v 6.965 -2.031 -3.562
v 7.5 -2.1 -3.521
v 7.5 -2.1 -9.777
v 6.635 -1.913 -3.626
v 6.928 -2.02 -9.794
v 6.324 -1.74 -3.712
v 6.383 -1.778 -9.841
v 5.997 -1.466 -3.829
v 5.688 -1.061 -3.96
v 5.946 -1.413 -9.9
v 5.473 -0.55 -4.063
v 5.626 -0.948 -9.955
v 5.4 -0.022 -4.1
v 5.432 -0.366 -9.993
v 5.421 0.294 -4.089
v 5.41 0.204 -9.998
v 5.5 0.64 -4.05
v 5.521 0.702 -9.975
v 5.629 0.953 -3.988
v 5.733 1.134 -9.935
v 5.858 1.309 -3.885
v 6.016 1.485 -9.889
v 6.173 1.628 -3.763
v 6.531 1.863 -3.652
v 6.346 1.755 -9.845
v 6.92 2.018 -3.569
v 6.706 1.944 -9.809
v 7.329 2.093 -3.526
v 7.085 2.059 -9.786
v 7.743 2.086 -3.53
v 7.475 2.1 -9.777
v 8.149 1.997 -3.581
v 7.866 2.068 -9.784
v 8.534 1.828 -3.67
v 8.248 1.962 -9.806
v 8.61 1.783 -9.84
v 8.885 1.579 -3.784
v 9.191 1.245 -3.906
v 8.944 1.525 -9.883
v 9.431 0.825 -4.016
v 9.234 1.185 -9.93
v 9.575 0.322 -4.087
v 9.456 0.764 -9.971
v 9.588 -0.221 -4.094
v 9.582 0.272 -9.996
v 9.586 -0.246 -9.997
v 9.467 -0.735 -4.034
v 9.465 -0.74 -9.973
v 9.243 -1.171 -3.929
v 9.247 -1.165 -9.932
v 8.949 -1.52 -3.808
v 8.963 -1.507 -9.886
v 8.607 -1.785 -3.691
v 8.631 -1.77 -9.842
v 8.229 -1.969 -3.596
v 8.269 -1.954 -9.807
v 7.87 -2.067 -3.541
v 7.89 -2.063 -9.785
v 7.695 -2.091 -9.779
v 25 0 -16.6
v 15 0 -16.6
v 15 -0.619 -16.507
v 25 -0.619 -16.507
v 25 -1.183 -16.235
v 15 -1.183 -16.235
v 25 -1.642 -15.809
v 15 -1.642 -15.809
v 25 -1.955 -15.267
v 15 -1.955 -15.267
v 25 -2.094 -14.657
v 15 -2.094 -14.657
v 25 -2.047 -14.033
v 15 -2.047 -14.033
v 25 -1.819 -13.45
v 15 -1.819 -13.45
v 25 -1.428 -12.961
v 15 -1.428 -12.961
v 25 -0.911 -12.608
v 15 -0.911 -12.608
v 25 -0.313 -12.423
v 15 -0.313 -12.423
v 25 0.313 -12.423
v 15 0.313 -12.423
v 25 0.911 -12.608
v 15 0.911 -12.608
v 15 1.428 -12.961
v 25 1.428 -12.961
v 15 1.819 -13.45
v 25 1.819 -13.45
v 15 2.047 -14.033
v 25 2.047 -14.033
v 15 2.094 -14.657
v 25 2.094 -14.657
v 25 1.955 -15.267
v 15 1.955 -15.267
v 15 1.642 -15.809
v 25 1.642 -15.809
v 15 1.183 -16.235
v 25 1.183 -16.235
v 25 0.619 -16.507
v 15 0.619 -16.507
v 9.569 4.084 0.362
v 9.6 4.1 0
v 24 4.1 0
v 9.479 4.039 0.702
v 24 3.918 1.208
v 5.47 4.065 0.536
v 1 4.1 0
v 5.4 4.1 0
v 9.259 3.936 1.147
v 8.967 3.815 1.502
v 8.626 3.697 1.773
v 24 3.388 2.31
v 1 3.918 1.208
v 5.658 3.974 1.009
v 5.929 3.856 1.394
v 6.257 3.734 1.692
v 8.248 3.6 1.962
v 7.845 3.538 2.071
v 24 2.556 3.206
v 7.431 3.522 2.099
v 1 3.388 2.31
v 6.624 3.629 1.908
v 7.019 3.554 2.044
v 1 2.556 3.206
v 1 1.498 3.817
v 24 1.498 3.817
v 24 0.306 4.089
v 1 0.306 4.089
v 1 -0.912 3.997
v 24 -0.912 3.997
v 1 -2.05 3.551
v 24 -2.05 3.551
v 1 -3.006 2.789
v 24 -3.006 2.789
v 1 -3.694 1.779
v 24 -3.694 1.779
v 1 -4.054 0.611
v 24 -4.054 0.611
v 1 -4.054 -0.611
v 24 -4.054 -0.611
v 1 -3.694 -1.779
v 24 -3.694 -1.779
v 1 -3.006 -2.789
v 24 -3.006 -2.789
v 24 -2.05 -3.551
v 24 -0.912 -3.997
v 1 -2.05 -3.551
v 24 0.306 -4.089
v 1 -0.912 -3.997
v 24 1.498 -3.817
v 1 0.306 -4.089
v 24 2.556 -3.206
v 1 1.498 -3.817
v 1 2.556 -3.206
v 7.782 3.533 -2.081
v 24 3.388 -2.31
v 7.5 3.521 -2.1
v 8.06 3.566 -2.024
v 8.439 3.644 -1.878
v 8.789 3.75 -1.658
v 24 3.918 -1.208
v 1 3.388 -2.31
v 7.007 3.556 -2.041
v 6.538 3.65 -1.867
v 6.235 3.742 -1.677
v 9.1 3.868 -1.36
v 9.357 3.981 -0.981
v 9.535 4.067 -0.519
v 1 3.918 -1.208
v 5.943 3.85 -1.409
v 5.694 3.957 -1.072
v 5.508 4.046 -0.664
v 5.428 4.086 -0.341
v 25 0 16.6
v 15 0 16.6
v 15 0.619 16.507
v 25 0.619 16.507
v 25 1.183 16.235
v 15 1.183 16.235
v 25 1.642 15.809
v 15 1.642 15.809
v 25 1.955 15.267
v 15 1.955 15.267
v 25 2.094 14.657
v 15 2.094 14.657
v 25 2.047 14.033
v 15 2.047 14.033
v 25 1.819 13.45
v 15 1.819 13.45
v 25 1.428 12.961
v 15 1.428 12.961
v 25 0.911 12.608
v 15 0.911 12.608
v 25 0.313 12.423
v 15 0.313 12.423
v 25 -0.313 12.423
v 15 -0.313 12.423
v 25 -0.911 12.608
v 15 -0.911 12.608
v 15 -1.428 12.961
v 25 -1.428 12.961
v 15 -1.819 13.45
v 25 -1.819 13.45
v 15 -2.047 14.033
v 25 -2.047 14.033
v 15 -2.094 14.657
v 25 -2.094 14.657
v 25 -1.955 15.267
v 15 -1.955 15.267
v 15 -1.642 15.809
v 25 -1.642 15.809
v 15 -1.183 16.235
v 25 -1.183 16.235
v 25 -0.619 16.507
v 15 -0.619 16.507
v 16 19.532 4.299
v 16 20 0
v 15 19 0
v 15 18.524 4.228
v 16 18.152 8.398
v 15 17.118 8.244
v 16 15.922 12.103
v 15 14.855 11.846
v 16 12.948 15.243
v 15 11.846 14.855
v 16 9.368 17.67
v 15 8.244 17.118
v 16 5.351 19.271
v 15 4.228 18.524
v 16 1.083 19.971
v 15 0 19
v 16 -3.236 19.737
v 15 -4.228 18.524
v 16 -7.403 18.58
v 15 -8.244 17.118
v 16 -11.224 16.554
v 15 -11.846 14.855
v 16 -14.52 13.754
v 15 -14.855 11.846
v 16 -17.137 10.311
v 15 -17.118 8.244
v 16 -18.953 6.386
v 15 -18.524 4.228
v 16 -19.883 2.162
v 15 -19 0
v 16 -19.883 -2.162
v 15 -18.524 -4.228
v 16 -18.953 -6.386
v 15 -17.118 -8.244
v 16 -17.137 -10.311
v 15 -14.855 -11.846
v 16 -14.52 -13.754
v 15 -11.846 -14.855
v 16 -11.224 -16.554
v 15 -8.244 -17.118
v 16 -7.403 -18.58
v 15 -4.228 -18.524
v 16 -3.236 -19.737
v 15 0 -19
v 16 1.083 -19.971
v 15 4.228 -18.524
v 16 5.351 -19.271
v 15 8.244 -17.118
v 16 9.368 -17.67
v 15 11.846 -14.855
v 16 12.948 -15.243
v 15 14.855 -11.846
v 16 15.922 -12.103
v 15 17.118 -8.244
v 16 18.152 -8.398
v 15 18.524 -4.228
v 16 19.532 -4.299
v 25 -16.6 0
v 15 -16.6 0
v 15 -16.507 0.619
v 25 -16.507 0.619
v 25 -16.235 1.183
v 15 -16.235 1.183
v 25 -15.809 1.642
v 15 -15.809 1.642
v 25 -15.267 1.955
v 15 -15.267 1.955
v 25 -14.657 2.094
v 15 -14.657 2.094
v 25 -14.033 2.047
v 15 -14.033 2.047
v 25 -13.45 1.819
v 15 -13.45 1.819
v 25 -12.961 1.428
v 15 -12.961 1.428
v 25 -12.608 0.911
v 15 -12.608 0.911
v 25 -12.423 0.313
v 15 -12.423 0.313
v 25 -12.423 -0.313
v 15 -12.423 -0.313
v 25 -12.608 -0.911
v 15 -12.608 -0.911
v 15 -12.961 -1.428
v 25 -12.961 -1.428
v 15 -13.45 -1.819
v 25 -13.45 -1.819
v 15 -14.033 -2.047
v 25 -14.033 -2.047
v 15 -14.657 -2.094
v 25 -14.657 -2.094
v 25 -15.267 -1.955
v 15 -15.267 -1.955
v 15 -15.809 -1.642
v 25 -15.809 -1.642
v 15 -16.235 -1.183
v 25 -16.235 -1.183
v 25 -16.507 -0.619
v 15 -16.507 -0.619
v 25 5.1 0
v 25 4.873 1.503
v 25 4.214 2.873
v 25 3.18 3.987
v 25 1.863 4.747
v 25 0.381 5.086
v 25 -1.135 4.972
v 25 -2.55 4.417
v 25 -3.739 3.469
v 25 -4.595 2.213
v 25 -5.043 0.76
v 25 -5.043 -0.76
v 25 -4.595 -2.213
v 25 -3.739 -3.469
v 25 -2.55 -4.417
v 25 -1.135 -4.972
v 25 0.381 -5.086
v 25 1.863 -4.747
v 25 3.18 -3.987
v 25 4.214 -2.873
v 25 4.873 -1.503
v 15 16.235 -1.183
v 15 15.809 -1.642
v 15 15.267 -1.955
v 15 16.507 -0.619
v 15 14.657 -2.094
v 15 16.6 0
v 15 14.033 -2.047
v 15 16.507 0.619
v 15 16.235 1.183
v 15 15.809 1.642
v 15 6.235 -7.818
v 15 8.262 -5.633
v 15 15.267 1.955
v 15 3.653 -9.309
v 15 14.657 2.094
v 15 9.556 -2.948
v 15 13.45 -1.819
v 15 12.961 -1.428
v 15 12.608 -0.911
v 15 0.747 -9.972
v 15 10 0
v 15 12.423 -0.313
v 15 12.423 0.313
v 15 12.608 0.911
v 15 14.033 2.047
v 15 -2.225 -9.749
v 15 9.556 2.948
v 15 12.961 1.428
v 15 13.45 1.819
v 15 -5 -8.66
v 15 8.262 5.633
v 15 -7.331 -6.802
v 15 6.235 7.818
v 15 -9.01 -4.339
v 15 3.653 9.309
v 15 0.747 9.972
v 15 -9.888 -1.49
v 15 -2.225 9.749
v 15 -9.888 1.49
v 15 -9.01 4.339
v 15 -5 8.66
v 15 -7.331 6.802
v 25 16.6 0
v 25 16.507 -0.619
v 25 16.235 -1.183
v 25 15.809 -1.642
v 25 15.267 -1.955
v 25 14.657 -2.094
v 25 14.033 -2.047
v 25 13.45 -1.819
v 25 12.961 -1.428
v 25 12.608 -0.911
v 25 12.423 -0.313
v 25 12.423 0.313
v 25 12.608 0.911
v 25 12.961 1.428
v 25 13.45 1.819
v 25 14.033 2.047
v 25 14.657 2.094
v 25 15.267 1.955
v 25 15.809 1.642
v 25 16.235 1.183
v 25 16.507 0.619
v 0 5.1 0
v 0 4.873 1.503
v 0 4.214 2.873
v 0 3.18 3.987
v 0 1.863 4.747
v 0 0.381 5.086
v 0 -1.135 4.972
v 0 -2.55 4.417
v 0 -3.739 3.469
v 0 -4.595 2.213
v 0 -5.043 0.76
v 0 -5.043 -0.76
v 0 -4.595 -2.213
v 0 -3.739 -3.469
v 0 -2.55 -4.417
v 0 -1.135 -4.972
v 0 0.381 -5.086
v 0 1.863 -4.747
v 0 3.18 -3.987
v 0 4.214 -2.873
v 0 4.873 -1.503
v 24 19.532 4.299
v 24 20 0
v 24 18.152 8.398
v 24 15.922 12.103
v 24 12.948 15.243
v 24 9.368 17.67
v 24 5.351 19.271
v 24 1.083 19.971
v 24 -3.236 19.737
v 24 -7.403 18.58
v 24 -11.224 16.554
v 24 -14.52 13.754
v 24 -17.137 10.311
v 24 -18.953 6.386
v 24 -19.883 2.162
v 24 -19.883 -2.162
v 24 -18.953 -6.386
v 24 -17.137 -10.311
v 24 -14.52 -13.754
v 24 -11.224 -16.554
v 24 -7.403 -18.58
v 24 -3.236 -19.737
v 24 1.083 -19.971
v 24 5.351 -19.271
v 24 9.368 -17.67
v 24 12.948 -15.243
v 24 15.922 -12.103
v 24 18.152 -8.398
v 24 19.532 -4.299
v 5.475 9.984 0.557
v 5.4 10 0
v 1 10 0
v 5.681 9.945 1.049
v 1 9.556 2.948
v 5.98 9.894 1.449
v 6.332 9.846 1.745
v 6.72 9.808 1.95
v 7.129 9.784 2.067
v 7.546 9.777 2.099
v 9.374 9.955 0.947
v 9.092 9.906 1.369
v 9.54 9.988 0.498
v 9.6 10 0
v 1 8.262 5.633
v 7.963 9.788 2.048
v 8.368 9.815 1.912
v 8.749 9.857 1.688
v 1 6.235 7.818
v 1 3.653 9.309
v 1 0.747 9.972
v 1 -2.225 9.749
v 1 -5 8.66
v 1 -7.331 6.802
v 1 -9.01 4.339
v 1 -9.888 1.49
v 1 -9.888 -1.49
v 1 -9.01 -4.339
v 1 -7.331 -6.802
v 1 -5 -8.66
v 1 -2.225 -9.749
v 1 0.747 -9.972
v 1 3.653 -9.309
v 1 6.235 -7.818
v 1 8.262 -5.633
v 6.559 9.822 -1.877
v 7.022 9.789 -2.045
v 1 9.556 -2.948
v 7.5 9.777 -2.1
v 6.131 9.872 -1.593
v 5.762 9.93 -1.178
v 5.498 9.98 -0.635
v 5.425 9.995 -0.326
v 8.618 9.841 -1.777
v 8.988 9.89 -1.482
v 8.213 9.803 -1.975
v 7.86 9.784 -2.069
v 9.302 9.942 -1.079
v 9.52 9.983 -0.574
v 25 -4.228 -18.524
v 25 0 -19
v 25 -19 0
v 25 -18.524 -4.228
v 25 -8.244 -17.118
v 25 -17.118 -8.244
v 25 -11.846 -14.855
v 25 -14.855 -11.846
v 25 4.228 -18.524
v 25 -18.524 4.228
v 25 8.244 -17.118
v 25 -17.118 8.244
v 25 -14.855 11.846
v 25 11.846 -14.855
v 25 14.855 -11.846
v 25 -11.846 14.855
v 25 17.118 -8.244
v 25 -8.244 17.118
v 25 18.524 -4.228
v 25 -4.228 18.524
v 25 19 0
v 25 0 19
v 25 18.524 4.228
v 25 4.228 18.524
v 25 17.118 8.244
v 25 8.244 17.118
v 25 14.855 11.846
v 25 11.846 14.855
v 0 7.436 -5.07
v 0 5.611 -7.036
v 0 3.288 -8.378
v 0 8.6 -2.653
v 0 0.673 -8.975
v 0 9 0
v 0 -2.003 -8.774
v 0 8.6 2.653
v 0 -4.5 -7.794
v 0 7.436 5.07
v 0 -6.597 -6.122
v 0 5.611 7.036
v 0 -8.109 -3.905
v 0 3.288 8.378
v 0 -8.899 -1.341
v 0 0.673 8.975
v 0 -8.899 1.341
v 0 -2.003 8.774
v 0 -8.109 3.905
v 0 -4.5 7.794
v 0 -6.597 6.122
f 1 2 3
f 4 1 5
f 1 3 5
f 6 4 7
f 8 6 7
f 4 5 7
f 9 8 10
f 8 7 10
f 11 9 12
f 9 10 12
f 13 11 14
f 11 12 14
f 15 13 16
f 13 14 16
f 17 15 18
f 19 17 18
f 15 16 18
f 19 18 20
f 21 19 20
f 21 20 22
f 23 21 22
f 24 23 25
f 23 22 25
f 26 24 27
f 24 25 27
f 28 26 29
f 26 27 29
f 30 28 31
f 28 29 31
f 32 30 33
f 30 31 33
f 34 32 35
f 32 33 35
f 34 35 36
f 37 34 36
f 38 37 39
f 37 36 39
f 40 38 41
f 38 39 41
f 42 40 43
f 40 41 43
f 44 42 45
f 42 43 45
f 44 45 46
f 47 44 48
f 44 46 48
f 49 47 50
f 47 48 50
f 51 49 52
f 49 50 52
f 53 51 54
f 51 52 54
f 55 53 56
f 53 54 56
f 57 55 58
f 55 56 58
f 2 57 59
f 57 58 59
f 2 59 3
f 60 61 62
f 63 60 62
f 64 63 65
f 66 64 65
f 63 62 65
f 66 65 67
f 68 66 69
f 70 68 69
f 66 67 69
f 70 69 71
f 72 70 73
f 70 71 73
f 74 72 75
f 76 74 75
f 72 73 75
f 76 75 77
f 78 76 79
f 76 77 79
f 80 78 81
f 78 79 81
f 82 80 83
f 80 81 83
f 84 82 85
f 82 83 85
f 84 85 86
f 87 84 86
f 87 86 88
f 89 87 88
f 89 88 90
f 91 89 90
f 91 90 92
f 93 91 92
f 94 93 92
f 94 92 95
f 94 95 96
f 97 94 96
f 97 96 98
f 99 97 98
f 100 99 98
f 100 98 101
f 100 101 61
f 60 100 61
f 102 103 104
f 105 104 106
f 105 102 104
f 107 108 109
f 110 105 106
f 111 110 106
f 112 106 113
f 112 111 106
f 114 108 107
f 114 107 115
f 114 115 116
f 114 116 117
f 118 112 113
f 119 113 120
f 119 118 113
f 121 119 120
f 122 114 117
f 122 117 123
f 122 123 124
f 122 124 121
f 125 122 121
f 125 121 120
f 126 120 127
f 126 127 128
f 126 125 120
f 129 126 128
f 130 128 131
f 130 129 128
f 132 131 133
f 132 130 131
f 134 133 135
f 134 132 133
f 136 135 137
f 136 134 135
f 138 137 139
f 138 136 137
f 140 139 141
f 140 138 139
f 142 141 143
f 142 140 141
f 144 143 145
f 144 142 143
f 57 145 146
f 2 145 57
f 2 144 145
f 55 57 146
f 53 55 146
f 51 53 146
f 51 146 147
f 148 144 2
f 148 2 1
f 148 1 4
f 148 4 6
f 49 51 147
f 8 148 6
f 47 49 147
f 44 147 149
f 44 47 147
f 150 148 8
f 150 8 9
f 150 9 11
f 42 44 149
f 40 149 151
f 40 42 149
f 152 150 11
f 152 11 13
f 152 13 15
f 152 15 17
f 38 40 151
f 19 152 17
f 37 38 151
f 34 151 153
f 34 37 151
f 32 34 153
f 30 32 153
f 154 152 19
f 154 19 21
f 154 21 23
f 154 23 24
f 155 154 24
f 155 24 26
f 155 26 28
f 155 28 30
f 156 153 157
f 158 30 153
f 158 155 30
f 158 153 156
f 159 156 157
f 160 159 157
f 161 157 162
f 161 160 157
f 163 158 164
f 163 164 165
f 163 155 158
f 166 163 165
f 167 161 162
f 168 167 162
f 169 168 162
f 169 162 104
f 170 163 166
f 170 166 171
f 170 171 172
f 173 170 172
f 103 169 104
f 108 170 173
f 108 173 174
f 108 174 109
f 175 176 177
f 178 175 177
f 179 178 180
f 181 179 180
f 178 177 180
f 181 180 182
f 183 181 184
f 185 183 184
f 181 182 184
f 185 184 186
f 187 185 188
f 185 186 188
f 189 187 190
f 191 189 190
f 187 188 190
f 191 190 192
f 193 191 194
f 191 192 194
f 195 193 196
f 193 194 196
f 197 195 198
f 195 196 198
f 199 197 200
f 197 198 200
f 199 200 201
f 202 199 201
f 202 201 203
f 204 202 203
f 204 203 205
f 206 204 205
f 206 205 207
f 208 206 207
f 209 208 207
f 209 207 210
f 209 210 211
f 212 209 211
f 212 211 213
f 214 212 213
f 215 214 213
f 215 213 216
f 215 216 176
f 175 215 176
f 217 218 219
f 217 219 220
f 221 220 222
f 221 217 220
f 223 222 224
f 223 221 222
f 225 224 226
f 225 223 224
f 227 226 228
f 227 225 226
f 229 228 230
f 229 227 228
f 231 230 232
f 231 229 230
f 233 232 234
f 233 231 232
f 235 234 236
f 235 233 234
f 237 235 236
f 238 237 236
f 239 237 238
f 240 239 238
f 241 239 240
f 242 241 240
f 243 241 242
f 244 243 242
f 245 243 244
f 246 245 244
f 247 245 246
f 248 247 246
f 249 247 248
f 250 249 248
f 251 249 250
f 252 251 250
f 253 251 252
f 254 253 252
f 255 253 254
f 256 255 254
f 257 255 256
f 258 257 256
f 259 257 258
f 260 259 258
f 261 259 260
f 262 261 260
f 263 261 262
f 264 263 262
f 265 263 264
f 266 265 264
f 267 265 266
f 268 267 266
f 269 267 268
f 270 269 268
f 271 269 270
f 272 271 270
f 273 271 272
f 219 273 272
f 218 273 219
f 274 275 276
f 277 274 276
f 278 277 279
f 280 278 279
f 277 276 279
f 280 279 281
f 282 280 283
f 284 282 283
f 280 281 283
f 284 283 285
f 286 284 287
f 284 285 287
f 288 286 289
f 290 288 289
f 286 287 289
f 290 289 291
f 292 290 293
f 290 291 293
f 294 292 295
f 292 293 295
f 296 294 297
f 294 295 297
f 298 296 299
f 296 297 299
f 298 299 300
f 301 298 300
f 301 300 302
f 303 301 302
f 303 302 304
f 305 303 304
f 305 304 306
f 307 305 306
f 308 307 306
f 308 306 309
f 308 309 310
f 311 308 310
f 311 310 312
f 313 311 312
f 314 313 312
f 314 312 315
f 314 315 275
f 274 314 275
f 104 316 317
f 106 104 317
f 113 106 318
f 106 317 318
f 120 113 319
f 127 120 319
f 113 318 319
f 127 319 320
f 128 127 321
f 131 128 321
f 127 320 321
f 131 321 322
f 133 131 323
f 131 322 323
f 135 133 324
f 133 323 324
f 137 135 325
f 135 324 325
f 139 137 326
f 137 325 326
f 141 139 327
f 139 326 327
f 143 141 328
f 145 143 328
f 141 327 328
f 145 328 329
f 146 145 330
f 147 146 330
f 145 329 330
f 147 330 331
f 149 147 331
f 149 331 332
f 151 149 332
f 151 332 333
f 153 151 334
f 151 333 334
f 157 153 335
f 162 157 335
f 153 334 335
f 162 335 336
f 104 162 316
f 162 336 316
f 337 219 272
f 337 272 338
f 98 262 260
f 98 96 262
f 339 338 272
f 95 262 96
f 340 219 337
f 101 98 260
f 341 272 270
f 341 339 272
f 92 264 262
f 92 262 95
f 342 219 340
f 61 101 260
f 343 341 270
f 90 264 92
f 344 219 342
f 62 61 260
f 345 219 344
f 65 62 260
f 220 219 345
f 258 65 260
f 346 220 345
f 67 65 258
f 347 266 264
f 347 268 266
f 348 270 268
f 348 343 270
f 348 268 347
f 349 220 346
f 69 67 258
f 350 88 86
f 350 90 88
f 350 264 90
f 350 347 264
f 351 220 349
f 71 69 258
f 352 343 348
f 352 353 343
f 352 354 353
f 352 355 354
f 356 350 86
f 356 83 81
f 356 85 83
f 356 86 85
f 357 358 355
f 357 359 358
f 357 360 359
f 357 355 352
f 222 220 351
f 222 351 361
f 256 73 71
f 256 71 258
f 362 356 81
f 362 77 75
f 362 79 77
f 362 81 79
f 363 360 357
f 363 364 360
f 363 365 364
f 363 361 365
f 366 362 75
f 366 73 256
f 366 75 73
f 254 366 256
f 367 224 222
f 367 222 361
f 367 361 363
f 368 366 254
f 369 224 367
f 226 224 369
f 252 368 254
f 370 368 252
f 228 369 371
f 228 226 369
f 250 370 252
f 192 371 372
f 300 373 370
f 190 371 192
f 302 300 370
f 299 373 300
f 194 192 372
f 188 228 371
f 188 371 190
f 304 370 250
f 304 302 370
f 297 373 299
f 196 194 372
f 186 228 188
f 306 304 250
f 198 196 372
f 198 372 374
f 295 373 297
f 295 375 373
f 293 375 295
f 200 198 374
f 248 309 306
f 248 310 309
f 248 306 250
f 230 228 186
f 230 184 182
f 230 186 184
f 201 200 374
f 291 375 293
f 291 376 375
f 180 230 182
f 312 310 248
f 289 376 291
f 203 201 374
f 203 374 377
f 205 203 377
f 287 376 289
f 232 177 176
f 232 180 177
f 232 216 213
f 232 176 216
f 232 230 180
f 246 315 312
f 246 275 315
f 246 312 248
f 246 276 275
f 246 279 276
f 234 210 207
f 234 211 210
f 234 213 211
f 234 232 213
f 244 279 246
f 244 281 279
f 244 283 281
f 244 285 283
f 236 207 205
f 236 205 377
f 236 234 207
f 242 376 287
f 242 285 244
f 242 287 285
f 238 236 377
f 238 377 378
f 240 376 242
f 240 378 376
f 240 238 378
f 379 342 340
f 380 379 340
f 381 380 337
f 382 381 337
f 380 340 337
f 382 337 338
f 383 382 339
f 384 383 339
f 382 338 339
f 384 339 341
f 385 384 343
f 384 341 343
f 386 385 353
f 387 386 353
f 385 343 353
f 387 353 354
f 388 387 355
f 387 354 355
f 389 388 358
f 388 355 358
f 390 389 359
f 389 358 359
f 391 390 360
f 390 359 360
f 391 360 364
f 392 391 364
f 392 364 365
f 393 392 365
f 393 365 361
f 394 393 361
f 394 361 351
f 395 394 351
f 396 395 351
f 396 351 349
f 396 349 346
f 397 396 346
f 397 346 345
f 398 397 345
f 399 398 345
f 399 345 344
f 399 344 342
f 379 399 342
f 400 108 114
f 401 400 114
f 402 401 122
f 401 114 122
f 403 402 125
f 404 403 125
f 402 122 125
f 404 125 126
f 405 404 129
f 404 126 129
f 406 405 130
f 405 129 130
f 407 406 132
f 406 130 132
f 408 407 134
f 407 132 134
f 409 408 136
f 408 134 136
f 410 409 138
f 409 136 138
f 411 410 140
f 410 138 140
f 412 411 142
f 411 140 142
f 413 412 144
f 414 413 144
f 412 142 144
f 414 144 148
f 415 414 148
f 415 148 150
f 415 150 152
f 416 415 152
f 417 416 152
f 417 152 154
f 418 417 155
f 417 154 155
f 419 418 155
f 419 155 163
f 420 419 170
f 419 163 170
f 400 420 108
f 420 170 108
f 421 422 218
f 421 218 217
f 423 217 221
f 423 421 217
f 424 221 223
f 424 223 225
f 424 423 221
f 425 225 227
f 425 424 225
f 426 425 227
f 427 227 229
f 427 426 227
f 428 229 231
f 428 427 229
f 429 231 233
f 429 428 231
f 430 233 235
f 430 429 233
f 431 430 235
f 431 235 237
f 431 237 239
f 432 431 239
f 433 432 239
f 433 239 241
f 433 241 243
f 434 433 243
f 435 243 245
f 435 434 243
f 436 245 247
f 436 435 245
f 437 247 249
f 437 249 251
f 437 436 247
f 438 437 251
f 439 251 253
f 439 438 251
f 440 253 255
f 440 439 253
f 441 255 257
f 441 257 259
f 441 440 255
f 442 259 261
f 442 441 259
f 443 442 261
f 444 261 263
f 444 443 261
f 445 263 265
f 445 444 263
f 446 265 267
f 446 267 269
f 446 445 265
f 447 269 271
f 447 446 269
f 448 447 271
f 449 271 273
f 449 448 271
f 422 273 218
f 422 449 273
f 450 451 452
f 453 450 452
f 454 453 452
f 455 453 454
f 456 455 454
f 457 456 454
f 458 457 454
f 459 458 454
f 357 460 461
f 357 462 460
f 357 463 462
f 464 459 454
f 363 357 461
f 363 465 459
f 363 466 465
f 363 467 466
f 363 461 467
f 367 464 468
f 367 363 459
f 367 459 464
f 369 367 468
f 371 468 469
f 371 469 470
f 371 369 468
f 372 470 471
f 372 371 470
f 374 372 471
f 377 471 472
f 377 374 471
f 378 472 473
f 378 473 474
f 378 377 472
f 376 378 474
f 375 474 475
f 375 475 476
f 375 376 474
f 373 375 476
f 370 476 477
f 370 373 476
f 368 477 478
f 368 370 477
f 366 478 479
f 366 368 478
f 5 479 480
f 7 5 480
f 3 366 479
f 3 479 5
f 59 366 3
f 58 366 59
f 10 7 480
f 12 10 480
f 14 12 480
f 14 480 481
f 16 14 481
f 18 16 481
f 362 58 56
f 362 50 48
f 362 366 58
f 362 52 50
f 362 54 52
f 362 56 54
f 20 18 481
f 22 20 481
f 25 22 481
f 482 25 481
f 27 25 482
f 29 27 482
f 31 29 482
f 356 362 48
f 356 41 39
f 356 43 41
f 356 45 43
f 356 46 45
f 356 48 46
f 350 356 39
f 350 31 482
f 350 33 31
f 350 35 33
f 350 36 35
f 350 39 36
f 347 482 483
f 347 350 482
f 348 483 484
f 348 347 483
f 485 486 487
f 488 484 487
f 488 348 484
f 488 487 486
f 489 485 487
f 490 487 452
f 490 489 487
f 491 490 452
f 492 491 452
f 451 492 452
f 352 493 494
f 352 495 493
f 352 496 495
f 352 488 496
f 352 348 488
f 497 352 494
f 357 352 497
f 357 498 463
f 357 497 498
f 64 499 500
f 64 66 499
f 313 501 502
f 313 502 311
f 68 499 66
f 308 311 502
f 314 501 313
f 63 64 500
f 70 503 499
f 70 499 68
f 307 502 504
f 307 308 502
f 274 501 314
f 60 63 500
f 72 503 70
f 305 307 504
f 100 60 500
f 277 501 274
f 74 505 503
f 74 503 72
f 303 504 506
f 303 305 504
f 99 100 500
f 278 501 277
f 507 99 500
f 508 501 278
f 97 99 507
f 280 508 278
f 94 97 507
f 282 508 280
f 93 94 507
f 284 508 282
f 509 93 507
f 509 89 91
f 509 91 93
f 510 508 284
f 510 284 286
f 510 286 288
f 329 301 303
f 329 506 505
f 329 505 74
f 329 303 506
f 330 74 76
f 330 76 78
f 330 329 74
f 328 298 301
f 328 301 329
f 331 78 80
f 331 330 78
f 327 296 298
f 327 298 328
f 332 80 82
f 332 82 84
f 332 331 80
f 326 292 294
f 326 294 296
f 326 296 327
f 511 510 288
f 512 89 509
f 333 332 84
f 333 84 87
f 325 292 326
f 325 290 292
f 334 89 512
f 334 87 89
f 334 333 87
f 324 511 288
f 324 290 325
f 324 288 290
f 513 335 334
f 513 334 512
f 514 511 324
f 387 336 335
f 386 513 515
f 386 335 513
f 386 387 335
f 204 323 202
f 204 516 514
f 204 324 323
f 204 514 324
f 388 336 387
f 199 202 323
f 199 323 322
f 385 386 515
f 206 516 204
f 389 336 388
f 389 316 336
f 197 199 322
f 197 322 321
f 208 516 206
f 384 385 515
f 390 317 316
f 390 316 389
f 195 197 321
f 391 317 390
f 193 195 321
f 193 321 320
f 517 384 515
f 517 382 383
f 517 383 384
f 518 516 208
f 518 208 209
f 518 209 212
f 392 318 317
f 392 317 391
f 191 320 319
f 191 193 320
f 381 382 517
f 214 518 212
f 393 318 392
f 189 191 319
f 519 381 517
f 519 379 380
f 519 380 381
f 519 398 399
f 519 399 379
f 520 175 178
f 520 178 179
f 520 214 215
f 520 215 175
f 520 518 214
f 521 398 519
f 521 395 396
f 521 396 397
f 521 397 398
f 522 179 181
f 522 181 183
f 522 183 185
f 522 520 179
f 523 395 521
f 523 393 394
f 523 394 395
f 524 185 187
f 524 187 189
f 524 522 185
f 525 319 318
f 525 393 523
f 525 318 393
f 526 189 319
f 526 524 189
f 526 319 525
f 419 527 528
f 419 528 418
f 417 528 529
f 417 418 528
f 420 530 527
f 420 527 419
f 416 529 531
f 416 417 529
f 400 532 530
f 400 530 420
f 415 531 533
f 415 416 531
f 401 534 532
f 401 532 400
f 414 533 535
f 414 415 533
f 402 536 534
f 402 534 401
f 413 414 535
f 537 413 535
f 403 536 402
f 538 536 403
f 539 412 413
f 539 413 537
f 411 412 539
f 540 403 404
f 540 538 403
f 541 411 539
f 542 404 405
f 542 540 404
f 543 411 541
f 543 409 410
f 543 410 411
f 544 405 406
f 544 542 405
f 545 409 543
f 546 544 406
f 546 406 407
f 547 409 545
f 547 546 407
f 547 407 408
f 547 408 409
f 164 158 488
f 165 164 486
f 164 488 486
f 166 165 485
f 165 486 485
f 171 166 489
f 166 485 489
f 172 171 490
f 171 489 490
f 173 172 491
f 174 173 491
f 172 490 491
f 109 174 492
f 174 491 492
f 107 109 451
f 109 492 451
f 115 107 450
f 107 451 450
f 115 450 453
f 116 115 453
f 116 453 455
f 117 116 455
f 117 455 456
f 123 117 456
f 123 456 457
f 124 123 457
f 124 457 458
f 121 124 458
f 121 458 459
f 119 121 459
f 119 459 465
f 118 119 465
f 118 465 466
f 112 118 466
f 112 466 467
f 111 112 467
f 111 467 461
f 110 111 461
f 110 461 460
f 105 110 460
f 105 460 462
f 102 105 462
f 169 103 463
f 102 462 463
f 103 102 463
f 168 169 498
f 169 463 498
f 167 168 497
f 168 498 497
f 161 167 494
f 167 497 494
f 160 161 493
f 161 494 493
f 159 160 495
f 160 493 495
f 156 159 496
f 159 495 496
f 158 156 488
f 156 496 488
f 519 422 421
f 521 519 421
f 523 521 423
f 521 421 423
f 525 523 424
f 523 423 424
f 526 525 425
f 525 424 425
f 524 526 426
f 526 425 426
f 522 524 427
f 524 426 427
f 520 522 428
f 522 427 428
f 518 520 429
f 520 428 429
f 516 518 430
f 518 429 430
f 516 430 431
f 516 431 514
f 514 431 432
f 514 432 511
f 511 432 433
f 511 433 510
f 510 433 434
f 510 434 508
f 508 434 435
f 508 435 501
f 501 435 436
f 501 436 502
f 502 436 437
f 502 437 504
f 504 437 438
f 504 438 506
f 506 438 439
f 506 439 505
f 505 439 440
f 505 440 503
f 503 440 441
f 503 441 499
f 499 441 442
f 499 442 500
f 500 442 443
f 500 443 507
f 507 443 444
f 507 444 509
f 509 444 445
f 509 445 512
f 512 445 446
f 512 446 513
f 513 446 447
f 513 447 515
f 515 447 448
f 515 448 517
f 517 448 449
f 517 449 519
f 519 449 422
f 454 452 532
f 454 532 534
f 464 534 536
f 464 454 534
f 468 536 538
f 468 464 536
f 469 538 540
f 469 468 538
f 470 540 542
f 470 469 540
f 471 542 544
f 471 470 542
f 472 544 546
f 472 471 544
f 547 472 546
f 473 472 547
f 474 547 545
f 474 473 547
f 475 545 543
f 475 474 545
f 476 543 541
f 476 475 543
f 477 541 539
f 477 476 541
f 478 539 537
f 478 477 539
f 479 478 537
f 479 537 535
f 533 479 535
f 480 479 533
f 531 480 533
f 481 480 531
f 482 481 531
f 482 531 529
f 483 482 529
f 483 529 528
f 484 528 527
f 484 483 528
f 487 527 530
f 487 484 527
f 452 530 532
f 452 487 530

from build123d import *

# Parameters (mm, degrees)
M5X0_8_TAPPED_HOLE1_D = 4.2
CIRPATTERN1_COUNT     = 4
SKETCH6_W             = 2.1
SKETCH6_H             = 20
CIRPATTERN2_COUNT     = 2
CIRPATTERN2_ANGLE     = 90
CHAMFER1_SIZE         = 1


with BuildPart() as part:
    # Sketch1 → Revolve1 (revolve)
    with BuildSketch(Plane.XY):
        Polygon((0, 4.1), (0, 10), (15, 10), (15, 20), (25, 20), (25, 4.1), align=None)
    revolve(axis=Axis((0, 0, 0), (1, 0, 0)))

    # M5x0.8 Tapped Hole1 (through all)
    with Locations(Plane(origin=(25, 0, 0), x_dir=(0, 0, -1), z_dir=(1, 0, 0))):
        with Locations((-14.5, 0)):
            m5x0_8_tapped_hole1 = Hole(M5X0_8_TAPPED_HOLE1_D / 2)

    # CirPattern1: M5x0.8 Tapped Hole1 ×4 about axis
    cirpattern1_axis = Axis((0, 0, 0), (1, 0, 0))
    for i in range(1, CIRPATTERN1_COUNT):
        add(m5x0_8_tapped_hole1.rotate(cirpattern1_axis, i * 360 / CIRPATTERN1_COUNT), mode=Mode.SUBTRACT)

    # Sketch6 → M5x0.8 Tapped Hole2 (revolve, cut)
    with BuildSketch(Plane(origin=(7.5, 0, 0), x_dir=(0, 0, -1), z_dir=(1, 0, 0))):
        with Locations((1.05, 10)):
            Rectangle(SKETCH6_W, SKETCH6_H)
    m5x0_8_tapped_hole2 = revolve(axis=Axis((7.5, -6.35, 0), (0, 1, 0)), mode=Mode.SUBTRACT)

    # CirPattern2: M5x0.8 Tapped Hole2 ×2 about axis
    cirpattern2_axis = Axis((25, 0, 0), (-1, 0, 0))
    for i in range(1, CIRPATTERN2_COUNT):
        add(m5x0_8_tapped_hole2.rotate(cirpattern2_axis, i * CIRPATTERN2_ANGLE / (CIRPATTERN2_COUNT - 1)), mode=Mode.SUBTRACT)

    # Chamfer1
    chamfer1_edges = [part.edges().sort_by_distance(p)[0] for p in [
        (25, -4.1, 0),
        (25, -20, 0),
        (15, -20, 0),
        (0, -10, 0),
        (0, -4.1, 0),
    ]]
    chamfer(chamfer1_edges, length=CHAMFER1_SIZE)


solid = part.part
